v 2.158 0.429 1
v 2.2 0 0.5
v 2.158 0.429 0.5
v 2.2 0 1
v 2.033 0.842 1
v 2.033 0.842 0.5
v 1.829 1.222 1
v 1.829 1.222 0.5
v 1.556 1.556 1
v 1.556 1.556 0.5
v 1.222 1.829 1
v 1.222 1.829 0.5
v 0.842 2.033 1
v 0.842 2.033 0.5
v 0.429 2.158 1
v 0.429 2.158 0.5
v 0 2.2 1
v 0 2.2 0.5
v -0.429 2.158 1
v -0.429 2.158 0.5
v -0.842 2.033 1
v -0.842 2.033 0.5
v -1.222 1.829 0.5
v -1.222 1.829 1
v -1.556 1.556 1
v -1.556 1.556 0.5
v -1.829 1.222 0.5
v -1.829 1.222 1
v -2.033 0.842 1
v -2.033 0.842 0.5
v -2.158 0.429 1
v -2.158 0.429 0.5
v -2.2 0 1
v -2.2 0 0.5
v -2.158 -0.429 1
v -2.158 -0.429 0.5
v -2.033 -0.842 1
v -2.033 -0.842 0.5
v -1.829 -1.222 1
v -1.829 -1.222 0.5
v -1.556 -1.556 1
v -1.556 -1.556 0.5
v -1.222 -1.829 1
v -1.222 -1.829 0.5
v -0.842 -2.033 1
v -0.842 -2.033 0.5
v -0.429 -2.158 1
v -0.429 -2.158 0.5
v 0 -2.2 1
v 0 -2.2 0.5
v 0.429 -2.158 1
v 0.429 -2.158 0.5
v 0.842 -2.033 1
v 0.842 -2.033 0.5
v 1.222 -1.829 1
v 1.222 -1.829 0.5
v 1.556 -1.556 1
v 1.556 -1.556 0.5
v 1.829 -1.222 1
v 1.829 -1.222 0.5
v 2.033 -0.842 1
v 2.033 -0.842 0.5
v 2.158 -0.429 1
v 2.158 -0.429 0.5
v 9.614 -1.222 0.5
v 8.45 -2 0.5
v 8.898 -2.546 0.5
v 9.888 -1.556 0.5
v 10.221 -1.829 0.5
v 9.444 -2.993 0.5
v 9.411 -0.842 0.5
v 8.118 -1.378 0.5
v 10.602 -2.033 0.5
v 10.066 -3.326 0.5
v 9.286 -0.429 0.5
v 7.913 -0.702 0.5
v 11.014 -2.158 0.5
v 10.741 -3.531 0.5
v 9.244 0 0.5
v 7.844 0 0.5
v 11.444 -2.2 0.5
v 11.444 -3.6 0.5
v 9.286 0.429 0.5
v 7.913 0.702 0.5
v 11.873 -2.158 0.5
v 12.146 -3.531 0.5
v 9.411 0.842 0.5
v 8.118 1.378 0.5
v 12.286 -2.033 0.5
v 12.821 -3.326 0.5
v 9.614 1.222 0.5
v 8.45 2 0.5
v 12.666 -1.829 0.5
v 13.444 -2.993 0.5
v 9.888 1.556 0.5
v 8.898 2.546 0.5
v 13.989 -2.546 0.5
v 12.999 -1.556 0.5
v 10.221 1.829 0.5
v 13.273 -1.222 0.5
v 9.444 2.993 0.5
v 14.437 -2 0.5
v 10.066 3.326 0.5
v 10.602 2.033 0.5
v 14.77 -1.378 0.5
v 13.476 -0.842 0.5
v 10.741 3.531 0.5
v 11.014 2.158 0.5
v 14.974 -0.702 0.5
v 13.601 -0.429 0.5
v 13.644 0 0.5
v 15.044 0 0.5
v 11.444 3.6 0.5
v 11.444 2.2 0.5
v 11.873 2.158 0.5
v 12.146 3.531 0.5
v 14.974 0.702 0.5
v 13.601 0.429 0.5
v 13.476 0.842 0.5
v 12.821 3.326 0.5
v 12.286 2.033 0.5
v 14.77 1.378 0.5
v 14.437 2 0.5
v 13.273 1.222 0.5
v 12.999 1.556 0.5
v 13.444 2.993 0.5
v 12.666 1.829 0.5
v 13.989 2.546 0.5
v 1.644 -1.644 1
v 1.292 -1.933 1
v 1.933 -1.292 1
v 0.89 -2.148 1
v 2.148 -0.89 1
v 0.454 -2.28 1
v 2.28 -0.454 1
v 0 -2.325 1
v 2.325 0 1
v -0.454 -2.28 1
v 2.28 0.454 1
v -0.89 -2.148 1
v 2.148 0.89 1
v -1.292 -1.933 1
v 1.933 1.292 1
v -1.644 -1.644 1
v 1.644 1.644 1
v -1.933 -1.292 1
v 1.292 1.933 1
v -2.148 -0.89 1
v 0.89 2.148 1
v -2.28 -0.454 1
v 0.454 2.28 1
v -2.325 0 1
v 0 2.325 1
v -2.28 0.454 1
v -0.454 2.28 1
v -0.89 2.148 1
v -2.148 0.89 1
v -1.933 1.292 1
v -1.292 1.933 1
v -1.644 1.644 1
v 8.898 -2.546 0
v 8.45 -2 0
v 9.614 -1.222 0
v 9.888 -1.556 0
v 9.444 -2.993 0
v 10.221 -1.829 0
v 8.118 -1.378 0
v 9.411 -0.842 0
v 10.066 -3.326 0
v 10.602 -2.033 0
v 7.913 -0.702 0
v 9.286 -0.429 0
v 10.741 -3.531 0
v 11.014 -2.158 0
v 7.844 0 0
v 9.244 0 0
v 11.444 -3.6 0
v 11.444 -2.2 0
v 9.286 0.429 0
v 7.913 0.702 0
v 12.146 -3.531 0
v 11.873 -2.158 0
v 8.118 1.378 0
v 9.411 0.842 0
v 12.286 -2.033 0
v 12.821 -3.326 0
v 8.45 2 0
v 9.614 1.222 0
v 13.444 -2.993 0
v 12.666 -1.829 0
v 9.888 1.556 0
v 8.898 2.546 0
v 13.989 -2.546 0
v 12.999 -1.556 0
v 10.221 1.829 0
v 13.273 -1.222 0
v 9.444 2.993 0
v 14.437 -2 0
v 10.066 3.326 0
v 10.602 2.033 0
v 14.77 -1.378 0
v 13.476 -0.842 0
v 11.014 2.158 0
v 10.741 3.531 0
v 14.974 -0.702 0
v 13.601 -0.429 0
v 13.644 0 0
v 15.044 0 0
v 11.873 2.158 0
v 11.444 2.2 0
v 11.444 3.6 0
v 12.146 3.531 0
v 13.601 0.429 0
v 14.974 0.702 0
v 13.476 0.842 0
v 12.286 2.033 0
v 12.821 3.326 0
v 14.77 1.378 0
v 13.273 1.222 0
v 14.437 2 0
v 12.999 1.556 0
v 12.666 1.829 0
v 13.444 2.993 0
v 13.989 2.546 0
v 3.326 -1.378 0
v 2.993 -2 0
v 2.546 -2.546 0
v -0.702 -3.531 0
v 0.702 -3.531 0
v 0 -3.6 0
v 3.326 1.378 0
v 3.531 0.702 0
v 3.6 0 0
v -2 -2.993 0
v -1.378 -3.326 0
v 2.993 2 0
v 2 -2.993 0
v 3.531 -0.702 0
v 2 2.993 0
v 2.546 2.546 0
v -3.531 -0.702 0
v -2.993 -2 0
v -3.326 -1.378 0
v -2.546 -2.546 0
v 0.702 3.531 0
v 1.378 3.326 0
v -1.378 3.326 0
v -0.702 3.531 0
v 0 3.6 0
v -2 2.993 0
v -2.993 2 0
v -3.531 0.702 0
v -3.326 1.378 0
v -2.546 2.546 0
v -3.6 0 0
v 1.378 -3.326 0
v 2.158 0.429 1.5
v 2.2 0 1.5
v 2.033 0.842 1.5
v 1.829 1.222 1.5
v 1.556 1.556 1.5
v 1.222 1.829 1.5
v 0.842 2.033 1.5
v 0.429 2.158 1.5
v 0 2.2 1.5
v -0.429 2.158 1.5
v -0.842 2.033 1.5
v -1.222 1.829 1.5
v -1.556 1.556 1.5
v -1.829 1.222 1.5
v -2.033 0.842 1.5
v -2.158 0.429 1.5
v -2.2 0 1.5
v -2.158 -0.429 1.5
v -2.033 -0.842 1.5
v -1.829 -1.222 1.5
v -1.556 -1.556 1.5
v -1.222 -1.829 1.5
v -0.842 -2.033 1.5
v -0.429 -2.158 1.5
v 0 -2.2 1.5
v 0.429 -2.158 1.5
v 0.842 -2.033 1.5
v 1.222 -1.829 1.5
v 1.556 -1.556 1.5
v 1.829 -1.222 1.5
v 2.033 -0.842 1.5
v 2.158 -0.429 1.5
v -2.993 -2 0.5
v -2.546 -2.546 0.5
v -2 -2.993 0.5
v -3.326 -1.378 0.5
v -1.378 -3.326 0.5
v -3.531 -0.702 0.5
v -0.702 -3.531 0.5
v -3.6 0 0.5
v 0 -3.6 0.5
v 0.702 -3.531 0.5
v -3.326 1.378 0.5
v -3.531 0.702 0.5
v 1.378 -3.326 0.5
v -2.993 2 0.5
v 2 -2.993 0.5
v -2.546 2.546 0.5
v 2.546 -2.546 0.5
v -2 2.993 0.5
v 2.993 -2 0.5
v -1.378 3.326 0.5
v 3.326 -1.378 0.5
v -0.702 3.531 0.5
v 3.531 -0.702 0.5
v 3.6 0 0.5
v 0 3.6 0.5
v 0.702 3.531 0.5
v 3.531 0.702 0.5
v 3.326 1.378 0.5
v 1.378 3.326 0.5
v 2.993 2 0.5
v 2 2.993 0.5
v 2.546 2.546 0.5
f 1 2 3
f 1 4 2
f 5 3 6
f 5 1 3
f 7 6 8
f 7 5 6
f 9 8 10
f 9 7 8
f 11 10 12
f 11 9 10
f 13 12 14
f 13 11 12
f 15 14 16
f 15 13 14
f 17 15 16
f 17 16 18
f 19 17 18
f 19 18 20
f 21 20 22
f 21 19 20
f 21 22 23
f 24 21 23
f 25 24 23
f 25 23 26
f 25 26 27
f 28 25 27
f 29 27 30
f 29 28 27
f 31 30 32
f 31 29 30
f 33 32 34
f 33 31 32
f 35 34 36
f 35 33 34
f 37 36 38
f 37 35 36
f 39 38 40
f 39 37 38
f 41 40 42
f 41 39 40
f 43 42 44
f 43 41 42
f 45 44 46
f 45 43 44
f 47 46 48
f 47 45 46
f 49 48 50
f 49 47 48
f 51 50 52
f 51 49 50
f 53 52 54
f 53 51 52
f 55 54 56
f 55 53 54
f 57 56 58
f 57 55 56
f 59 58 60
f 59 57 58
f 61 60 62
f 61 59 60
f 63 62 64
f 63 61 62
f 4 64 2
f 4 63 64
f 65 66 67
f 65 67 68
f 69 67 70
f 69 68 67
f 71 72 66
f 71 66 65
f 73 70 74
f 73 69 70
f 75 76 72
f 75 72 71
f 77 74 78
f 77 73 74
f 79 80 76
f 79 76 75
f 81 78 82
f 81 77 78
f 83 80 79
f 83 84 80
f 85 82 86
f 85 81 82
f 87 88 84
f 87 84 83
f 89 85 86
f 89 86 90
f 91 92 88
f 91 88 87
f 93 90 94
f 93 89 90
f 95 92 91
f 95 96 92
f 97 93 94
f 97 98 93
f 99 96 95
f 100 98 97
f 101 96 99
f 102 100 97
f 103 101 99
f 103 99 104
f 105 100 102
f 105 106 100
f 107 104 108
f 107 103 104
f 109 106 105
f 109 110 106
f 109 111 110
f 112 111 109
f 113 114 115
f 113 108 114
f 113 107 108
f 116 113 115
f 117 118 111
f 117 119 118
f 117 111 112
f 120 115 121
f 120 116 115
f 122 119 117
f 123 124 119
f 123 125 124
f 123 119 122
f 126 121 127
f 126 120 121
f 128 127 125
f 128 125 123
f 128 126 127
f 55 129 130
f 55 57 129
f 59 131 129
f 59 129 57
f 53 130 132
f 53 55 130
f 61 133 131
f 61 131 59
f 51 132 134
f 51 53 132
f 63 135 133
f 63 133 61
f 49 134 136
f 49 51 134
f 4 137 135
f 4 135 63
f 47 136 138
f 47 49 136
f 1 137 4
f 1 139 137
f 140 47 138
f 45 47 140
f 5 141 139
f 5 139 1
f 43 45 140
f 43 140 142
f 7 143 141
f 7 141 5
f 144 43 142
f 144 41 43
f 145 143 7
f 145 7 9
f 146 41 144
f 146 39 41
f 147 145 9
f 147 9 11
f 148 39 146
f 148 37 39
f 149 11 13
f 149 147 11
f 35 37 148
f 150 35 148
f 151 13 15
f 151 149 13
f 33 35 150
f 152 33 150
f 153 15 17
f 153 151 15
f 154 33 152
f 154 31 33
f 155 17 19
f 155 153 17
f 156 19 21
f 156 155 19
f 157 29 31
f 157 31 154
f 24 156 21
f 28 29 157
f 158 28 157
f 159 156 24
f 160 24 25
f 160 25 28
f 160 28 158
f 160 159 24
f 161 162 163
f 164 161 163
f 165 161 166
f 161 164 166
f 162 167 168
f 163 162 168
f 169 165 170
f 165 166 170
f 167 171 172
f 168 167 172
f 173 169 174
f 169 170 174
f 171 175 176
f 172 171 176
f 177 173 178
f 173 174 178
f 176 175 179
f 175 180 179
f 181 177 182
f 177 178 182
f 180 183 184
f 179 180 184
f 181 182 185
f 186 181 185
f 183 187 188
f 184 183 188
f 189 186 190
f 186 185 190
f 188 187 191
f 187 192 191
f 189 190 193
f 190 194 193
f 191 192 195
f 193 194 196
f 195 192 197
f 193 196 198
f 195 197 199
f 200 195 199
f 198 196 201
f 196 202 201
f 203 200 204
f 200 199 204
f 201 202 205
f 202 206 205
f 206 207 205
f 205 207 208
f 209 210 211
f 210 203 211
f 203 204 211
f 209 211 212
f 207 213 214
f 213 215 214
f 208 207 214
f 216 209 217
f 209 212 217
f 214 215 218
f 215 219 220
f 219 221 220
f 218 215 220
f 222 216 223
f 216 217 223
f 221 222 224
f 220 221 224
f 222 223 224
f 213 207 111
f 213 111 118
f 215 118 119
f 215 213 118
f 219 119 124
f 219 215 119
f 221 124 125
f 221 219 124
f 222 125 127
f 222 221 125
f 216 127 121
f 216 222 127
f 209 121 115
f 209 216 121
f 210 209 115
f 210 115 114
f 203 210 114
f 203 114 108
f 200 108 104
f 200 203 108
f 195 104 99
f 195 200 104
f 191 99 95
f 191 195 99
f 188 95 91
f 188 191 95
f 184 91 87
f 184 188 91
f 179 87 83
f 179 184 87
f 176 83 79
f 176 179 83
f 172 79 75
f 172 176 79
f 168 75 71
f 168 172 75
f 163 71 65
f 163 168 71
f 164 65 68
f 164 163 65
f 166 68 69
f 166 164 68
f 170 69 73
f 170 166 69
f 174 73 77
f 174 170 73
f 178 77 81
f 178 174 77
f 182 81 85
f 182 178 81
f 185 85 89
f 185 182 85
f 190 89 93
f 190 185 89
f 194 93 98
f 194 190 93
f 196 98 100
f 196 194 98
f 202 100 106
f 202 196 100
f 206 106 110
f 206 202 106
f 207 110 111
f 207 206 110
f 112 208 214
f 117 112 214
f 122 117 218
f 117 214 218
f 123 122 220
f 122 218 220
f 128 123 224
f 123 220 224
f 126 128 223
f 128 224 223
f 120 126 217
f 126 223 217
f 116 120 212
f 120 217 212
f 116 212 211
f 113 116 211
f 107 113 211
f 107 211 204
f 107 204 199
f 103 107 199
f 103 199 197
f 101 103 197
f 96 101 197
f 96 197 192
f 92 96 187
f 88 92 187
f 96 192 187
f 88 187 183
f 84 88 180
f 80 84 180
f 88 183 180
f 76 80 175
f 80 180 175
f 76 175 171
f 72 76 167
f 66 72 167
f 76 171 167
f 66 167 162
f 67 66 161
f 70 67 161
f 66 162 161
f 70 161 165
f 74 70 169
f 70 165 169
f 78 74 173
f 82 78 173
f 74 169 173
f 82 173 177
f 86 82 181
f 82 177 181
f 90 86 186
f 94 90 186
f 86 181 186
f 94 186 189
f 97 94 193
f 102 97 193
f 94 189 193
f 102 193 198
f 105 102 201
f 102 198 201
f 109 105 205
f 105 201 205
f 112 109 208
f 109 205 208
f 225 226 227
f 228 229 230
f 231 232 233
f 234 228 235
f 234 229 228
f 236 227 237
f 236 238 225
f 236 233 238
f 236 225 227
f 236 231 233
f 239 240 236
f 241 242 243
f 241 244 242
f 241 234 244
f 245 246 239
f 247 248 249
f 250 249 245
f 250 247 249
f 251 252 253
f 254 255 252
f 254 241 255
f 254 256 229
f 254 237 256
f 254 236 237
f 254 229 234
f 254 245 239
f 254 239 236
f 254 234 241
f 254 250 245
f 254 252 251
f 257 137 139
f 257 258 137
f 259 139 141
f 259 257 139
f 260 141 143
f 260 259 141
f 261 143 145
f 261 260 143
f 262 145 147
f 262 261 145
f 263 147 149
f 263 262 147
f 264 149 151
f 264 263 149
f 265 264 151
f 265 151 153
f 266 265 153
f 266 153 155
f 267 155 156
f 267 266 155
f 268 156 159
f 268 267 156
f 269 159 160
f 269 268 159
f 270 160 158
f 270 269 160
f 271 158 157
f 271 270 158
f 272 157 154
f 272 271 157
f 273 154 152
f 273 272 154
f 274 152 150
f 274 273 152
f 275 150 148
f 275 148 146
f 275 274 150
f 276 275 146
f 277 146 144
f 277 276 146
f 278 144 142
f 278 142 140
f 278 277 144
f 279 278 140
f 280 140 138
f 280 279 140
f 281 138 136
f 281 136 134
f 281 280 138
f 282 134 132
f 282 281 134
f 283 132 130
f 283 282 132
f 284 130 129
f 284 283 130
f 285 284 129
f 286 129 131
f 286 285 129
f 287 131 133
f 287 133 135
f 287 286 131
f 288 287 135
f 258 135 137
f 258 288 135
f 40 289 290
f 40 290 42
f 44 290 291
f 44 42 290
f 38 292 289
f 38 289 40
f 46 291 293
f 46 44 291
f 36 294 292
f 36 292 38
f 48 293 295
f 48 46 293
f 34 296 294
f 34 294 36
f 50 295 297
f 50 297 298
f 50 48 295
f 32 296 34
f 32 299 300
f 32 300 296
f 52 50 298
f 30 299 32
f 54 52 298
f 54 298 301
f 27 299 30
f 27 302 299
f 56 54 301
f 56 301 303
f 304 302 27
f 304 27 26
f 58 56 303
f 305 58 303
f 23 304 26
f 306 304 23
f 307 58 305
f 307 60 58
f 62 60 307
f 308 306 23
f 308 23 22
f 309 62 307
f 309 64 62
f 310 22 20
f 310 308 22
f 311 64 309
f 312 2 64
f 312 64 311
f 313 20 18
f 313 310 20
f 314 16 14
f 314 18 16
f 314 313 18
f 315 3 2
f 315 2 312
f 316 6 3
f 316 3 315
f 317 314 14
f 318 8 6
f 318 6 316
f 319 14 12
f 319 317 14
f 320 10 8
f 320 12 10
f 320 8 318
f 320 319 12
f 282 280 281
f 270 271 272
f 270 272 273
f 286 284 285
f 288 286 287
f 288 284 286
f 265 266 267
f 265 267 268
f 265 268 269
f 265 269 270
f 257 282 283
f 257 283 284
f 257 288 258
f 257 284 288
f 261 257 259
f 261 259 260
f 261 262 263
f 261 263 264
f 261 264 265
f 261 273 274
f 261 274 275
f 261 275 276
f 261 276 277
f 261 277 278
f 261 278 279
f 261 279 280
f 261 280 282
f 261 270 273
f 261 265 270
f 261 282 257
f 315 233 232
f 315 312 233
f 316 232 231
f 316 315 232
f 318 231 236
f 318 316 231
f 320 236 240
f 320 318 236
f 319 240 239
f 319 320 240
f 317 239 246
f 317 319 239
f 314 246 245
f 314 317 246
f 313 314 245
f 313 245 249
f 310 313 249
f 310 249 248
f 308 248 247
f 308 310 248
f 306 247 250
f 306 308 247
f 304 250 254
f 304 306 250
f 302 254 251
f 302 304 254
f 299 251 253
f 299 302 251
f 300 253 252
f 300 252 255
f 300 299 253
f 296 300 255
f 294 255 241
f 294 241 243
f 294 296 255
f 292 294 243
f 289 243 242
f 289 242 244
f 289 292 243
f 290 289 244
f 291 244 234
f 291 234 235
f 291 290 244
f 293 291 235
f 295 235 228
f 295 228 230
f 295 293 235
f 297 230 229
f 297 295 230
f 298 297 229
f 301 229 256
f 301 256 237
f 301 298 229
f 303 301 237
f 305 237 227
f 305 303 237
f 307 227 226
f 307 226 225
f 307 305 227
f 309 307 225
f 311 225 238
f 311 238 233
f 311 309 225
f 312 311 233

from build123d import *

# Parameters (mm, degrees)
F2_R     = 3.6
F2_R_2   = 2.2
F3_DEPTH = 0.5


with BuildPart() as f1:
    # F0 (on Front) → F1 (revolve)
    with BuildSketch(Plane.XZ):
        Polygon((2.325, 1), (2.2, 1.5), (2.2, 1), align=None)
        Polygon((0, 0.5), (0, 0), (2.2, 0), (3.6, 0), (3.6, 0.5), (2.2, 0.5), (2.2, 1), (2.2, 1.5), (0, 1.5), align=None)
    revolve(axis=Axis((0, 0, 0.75), (0, 0, 1)))


with BuildPart() as f3:
    # F2 (on Top) → F3 (new body)
    with BuildSketch(Plane.XY):
        with Locations((11.443656, 0)):
            Circle(F2_R)
        with Locations((11.443656, 0)):
            Circle(F2_R_2, mode=Mode.SUBTRACT)
    extrude(amount=F3_DEPTH)


solid = Compound([f1.part, f3.part])
